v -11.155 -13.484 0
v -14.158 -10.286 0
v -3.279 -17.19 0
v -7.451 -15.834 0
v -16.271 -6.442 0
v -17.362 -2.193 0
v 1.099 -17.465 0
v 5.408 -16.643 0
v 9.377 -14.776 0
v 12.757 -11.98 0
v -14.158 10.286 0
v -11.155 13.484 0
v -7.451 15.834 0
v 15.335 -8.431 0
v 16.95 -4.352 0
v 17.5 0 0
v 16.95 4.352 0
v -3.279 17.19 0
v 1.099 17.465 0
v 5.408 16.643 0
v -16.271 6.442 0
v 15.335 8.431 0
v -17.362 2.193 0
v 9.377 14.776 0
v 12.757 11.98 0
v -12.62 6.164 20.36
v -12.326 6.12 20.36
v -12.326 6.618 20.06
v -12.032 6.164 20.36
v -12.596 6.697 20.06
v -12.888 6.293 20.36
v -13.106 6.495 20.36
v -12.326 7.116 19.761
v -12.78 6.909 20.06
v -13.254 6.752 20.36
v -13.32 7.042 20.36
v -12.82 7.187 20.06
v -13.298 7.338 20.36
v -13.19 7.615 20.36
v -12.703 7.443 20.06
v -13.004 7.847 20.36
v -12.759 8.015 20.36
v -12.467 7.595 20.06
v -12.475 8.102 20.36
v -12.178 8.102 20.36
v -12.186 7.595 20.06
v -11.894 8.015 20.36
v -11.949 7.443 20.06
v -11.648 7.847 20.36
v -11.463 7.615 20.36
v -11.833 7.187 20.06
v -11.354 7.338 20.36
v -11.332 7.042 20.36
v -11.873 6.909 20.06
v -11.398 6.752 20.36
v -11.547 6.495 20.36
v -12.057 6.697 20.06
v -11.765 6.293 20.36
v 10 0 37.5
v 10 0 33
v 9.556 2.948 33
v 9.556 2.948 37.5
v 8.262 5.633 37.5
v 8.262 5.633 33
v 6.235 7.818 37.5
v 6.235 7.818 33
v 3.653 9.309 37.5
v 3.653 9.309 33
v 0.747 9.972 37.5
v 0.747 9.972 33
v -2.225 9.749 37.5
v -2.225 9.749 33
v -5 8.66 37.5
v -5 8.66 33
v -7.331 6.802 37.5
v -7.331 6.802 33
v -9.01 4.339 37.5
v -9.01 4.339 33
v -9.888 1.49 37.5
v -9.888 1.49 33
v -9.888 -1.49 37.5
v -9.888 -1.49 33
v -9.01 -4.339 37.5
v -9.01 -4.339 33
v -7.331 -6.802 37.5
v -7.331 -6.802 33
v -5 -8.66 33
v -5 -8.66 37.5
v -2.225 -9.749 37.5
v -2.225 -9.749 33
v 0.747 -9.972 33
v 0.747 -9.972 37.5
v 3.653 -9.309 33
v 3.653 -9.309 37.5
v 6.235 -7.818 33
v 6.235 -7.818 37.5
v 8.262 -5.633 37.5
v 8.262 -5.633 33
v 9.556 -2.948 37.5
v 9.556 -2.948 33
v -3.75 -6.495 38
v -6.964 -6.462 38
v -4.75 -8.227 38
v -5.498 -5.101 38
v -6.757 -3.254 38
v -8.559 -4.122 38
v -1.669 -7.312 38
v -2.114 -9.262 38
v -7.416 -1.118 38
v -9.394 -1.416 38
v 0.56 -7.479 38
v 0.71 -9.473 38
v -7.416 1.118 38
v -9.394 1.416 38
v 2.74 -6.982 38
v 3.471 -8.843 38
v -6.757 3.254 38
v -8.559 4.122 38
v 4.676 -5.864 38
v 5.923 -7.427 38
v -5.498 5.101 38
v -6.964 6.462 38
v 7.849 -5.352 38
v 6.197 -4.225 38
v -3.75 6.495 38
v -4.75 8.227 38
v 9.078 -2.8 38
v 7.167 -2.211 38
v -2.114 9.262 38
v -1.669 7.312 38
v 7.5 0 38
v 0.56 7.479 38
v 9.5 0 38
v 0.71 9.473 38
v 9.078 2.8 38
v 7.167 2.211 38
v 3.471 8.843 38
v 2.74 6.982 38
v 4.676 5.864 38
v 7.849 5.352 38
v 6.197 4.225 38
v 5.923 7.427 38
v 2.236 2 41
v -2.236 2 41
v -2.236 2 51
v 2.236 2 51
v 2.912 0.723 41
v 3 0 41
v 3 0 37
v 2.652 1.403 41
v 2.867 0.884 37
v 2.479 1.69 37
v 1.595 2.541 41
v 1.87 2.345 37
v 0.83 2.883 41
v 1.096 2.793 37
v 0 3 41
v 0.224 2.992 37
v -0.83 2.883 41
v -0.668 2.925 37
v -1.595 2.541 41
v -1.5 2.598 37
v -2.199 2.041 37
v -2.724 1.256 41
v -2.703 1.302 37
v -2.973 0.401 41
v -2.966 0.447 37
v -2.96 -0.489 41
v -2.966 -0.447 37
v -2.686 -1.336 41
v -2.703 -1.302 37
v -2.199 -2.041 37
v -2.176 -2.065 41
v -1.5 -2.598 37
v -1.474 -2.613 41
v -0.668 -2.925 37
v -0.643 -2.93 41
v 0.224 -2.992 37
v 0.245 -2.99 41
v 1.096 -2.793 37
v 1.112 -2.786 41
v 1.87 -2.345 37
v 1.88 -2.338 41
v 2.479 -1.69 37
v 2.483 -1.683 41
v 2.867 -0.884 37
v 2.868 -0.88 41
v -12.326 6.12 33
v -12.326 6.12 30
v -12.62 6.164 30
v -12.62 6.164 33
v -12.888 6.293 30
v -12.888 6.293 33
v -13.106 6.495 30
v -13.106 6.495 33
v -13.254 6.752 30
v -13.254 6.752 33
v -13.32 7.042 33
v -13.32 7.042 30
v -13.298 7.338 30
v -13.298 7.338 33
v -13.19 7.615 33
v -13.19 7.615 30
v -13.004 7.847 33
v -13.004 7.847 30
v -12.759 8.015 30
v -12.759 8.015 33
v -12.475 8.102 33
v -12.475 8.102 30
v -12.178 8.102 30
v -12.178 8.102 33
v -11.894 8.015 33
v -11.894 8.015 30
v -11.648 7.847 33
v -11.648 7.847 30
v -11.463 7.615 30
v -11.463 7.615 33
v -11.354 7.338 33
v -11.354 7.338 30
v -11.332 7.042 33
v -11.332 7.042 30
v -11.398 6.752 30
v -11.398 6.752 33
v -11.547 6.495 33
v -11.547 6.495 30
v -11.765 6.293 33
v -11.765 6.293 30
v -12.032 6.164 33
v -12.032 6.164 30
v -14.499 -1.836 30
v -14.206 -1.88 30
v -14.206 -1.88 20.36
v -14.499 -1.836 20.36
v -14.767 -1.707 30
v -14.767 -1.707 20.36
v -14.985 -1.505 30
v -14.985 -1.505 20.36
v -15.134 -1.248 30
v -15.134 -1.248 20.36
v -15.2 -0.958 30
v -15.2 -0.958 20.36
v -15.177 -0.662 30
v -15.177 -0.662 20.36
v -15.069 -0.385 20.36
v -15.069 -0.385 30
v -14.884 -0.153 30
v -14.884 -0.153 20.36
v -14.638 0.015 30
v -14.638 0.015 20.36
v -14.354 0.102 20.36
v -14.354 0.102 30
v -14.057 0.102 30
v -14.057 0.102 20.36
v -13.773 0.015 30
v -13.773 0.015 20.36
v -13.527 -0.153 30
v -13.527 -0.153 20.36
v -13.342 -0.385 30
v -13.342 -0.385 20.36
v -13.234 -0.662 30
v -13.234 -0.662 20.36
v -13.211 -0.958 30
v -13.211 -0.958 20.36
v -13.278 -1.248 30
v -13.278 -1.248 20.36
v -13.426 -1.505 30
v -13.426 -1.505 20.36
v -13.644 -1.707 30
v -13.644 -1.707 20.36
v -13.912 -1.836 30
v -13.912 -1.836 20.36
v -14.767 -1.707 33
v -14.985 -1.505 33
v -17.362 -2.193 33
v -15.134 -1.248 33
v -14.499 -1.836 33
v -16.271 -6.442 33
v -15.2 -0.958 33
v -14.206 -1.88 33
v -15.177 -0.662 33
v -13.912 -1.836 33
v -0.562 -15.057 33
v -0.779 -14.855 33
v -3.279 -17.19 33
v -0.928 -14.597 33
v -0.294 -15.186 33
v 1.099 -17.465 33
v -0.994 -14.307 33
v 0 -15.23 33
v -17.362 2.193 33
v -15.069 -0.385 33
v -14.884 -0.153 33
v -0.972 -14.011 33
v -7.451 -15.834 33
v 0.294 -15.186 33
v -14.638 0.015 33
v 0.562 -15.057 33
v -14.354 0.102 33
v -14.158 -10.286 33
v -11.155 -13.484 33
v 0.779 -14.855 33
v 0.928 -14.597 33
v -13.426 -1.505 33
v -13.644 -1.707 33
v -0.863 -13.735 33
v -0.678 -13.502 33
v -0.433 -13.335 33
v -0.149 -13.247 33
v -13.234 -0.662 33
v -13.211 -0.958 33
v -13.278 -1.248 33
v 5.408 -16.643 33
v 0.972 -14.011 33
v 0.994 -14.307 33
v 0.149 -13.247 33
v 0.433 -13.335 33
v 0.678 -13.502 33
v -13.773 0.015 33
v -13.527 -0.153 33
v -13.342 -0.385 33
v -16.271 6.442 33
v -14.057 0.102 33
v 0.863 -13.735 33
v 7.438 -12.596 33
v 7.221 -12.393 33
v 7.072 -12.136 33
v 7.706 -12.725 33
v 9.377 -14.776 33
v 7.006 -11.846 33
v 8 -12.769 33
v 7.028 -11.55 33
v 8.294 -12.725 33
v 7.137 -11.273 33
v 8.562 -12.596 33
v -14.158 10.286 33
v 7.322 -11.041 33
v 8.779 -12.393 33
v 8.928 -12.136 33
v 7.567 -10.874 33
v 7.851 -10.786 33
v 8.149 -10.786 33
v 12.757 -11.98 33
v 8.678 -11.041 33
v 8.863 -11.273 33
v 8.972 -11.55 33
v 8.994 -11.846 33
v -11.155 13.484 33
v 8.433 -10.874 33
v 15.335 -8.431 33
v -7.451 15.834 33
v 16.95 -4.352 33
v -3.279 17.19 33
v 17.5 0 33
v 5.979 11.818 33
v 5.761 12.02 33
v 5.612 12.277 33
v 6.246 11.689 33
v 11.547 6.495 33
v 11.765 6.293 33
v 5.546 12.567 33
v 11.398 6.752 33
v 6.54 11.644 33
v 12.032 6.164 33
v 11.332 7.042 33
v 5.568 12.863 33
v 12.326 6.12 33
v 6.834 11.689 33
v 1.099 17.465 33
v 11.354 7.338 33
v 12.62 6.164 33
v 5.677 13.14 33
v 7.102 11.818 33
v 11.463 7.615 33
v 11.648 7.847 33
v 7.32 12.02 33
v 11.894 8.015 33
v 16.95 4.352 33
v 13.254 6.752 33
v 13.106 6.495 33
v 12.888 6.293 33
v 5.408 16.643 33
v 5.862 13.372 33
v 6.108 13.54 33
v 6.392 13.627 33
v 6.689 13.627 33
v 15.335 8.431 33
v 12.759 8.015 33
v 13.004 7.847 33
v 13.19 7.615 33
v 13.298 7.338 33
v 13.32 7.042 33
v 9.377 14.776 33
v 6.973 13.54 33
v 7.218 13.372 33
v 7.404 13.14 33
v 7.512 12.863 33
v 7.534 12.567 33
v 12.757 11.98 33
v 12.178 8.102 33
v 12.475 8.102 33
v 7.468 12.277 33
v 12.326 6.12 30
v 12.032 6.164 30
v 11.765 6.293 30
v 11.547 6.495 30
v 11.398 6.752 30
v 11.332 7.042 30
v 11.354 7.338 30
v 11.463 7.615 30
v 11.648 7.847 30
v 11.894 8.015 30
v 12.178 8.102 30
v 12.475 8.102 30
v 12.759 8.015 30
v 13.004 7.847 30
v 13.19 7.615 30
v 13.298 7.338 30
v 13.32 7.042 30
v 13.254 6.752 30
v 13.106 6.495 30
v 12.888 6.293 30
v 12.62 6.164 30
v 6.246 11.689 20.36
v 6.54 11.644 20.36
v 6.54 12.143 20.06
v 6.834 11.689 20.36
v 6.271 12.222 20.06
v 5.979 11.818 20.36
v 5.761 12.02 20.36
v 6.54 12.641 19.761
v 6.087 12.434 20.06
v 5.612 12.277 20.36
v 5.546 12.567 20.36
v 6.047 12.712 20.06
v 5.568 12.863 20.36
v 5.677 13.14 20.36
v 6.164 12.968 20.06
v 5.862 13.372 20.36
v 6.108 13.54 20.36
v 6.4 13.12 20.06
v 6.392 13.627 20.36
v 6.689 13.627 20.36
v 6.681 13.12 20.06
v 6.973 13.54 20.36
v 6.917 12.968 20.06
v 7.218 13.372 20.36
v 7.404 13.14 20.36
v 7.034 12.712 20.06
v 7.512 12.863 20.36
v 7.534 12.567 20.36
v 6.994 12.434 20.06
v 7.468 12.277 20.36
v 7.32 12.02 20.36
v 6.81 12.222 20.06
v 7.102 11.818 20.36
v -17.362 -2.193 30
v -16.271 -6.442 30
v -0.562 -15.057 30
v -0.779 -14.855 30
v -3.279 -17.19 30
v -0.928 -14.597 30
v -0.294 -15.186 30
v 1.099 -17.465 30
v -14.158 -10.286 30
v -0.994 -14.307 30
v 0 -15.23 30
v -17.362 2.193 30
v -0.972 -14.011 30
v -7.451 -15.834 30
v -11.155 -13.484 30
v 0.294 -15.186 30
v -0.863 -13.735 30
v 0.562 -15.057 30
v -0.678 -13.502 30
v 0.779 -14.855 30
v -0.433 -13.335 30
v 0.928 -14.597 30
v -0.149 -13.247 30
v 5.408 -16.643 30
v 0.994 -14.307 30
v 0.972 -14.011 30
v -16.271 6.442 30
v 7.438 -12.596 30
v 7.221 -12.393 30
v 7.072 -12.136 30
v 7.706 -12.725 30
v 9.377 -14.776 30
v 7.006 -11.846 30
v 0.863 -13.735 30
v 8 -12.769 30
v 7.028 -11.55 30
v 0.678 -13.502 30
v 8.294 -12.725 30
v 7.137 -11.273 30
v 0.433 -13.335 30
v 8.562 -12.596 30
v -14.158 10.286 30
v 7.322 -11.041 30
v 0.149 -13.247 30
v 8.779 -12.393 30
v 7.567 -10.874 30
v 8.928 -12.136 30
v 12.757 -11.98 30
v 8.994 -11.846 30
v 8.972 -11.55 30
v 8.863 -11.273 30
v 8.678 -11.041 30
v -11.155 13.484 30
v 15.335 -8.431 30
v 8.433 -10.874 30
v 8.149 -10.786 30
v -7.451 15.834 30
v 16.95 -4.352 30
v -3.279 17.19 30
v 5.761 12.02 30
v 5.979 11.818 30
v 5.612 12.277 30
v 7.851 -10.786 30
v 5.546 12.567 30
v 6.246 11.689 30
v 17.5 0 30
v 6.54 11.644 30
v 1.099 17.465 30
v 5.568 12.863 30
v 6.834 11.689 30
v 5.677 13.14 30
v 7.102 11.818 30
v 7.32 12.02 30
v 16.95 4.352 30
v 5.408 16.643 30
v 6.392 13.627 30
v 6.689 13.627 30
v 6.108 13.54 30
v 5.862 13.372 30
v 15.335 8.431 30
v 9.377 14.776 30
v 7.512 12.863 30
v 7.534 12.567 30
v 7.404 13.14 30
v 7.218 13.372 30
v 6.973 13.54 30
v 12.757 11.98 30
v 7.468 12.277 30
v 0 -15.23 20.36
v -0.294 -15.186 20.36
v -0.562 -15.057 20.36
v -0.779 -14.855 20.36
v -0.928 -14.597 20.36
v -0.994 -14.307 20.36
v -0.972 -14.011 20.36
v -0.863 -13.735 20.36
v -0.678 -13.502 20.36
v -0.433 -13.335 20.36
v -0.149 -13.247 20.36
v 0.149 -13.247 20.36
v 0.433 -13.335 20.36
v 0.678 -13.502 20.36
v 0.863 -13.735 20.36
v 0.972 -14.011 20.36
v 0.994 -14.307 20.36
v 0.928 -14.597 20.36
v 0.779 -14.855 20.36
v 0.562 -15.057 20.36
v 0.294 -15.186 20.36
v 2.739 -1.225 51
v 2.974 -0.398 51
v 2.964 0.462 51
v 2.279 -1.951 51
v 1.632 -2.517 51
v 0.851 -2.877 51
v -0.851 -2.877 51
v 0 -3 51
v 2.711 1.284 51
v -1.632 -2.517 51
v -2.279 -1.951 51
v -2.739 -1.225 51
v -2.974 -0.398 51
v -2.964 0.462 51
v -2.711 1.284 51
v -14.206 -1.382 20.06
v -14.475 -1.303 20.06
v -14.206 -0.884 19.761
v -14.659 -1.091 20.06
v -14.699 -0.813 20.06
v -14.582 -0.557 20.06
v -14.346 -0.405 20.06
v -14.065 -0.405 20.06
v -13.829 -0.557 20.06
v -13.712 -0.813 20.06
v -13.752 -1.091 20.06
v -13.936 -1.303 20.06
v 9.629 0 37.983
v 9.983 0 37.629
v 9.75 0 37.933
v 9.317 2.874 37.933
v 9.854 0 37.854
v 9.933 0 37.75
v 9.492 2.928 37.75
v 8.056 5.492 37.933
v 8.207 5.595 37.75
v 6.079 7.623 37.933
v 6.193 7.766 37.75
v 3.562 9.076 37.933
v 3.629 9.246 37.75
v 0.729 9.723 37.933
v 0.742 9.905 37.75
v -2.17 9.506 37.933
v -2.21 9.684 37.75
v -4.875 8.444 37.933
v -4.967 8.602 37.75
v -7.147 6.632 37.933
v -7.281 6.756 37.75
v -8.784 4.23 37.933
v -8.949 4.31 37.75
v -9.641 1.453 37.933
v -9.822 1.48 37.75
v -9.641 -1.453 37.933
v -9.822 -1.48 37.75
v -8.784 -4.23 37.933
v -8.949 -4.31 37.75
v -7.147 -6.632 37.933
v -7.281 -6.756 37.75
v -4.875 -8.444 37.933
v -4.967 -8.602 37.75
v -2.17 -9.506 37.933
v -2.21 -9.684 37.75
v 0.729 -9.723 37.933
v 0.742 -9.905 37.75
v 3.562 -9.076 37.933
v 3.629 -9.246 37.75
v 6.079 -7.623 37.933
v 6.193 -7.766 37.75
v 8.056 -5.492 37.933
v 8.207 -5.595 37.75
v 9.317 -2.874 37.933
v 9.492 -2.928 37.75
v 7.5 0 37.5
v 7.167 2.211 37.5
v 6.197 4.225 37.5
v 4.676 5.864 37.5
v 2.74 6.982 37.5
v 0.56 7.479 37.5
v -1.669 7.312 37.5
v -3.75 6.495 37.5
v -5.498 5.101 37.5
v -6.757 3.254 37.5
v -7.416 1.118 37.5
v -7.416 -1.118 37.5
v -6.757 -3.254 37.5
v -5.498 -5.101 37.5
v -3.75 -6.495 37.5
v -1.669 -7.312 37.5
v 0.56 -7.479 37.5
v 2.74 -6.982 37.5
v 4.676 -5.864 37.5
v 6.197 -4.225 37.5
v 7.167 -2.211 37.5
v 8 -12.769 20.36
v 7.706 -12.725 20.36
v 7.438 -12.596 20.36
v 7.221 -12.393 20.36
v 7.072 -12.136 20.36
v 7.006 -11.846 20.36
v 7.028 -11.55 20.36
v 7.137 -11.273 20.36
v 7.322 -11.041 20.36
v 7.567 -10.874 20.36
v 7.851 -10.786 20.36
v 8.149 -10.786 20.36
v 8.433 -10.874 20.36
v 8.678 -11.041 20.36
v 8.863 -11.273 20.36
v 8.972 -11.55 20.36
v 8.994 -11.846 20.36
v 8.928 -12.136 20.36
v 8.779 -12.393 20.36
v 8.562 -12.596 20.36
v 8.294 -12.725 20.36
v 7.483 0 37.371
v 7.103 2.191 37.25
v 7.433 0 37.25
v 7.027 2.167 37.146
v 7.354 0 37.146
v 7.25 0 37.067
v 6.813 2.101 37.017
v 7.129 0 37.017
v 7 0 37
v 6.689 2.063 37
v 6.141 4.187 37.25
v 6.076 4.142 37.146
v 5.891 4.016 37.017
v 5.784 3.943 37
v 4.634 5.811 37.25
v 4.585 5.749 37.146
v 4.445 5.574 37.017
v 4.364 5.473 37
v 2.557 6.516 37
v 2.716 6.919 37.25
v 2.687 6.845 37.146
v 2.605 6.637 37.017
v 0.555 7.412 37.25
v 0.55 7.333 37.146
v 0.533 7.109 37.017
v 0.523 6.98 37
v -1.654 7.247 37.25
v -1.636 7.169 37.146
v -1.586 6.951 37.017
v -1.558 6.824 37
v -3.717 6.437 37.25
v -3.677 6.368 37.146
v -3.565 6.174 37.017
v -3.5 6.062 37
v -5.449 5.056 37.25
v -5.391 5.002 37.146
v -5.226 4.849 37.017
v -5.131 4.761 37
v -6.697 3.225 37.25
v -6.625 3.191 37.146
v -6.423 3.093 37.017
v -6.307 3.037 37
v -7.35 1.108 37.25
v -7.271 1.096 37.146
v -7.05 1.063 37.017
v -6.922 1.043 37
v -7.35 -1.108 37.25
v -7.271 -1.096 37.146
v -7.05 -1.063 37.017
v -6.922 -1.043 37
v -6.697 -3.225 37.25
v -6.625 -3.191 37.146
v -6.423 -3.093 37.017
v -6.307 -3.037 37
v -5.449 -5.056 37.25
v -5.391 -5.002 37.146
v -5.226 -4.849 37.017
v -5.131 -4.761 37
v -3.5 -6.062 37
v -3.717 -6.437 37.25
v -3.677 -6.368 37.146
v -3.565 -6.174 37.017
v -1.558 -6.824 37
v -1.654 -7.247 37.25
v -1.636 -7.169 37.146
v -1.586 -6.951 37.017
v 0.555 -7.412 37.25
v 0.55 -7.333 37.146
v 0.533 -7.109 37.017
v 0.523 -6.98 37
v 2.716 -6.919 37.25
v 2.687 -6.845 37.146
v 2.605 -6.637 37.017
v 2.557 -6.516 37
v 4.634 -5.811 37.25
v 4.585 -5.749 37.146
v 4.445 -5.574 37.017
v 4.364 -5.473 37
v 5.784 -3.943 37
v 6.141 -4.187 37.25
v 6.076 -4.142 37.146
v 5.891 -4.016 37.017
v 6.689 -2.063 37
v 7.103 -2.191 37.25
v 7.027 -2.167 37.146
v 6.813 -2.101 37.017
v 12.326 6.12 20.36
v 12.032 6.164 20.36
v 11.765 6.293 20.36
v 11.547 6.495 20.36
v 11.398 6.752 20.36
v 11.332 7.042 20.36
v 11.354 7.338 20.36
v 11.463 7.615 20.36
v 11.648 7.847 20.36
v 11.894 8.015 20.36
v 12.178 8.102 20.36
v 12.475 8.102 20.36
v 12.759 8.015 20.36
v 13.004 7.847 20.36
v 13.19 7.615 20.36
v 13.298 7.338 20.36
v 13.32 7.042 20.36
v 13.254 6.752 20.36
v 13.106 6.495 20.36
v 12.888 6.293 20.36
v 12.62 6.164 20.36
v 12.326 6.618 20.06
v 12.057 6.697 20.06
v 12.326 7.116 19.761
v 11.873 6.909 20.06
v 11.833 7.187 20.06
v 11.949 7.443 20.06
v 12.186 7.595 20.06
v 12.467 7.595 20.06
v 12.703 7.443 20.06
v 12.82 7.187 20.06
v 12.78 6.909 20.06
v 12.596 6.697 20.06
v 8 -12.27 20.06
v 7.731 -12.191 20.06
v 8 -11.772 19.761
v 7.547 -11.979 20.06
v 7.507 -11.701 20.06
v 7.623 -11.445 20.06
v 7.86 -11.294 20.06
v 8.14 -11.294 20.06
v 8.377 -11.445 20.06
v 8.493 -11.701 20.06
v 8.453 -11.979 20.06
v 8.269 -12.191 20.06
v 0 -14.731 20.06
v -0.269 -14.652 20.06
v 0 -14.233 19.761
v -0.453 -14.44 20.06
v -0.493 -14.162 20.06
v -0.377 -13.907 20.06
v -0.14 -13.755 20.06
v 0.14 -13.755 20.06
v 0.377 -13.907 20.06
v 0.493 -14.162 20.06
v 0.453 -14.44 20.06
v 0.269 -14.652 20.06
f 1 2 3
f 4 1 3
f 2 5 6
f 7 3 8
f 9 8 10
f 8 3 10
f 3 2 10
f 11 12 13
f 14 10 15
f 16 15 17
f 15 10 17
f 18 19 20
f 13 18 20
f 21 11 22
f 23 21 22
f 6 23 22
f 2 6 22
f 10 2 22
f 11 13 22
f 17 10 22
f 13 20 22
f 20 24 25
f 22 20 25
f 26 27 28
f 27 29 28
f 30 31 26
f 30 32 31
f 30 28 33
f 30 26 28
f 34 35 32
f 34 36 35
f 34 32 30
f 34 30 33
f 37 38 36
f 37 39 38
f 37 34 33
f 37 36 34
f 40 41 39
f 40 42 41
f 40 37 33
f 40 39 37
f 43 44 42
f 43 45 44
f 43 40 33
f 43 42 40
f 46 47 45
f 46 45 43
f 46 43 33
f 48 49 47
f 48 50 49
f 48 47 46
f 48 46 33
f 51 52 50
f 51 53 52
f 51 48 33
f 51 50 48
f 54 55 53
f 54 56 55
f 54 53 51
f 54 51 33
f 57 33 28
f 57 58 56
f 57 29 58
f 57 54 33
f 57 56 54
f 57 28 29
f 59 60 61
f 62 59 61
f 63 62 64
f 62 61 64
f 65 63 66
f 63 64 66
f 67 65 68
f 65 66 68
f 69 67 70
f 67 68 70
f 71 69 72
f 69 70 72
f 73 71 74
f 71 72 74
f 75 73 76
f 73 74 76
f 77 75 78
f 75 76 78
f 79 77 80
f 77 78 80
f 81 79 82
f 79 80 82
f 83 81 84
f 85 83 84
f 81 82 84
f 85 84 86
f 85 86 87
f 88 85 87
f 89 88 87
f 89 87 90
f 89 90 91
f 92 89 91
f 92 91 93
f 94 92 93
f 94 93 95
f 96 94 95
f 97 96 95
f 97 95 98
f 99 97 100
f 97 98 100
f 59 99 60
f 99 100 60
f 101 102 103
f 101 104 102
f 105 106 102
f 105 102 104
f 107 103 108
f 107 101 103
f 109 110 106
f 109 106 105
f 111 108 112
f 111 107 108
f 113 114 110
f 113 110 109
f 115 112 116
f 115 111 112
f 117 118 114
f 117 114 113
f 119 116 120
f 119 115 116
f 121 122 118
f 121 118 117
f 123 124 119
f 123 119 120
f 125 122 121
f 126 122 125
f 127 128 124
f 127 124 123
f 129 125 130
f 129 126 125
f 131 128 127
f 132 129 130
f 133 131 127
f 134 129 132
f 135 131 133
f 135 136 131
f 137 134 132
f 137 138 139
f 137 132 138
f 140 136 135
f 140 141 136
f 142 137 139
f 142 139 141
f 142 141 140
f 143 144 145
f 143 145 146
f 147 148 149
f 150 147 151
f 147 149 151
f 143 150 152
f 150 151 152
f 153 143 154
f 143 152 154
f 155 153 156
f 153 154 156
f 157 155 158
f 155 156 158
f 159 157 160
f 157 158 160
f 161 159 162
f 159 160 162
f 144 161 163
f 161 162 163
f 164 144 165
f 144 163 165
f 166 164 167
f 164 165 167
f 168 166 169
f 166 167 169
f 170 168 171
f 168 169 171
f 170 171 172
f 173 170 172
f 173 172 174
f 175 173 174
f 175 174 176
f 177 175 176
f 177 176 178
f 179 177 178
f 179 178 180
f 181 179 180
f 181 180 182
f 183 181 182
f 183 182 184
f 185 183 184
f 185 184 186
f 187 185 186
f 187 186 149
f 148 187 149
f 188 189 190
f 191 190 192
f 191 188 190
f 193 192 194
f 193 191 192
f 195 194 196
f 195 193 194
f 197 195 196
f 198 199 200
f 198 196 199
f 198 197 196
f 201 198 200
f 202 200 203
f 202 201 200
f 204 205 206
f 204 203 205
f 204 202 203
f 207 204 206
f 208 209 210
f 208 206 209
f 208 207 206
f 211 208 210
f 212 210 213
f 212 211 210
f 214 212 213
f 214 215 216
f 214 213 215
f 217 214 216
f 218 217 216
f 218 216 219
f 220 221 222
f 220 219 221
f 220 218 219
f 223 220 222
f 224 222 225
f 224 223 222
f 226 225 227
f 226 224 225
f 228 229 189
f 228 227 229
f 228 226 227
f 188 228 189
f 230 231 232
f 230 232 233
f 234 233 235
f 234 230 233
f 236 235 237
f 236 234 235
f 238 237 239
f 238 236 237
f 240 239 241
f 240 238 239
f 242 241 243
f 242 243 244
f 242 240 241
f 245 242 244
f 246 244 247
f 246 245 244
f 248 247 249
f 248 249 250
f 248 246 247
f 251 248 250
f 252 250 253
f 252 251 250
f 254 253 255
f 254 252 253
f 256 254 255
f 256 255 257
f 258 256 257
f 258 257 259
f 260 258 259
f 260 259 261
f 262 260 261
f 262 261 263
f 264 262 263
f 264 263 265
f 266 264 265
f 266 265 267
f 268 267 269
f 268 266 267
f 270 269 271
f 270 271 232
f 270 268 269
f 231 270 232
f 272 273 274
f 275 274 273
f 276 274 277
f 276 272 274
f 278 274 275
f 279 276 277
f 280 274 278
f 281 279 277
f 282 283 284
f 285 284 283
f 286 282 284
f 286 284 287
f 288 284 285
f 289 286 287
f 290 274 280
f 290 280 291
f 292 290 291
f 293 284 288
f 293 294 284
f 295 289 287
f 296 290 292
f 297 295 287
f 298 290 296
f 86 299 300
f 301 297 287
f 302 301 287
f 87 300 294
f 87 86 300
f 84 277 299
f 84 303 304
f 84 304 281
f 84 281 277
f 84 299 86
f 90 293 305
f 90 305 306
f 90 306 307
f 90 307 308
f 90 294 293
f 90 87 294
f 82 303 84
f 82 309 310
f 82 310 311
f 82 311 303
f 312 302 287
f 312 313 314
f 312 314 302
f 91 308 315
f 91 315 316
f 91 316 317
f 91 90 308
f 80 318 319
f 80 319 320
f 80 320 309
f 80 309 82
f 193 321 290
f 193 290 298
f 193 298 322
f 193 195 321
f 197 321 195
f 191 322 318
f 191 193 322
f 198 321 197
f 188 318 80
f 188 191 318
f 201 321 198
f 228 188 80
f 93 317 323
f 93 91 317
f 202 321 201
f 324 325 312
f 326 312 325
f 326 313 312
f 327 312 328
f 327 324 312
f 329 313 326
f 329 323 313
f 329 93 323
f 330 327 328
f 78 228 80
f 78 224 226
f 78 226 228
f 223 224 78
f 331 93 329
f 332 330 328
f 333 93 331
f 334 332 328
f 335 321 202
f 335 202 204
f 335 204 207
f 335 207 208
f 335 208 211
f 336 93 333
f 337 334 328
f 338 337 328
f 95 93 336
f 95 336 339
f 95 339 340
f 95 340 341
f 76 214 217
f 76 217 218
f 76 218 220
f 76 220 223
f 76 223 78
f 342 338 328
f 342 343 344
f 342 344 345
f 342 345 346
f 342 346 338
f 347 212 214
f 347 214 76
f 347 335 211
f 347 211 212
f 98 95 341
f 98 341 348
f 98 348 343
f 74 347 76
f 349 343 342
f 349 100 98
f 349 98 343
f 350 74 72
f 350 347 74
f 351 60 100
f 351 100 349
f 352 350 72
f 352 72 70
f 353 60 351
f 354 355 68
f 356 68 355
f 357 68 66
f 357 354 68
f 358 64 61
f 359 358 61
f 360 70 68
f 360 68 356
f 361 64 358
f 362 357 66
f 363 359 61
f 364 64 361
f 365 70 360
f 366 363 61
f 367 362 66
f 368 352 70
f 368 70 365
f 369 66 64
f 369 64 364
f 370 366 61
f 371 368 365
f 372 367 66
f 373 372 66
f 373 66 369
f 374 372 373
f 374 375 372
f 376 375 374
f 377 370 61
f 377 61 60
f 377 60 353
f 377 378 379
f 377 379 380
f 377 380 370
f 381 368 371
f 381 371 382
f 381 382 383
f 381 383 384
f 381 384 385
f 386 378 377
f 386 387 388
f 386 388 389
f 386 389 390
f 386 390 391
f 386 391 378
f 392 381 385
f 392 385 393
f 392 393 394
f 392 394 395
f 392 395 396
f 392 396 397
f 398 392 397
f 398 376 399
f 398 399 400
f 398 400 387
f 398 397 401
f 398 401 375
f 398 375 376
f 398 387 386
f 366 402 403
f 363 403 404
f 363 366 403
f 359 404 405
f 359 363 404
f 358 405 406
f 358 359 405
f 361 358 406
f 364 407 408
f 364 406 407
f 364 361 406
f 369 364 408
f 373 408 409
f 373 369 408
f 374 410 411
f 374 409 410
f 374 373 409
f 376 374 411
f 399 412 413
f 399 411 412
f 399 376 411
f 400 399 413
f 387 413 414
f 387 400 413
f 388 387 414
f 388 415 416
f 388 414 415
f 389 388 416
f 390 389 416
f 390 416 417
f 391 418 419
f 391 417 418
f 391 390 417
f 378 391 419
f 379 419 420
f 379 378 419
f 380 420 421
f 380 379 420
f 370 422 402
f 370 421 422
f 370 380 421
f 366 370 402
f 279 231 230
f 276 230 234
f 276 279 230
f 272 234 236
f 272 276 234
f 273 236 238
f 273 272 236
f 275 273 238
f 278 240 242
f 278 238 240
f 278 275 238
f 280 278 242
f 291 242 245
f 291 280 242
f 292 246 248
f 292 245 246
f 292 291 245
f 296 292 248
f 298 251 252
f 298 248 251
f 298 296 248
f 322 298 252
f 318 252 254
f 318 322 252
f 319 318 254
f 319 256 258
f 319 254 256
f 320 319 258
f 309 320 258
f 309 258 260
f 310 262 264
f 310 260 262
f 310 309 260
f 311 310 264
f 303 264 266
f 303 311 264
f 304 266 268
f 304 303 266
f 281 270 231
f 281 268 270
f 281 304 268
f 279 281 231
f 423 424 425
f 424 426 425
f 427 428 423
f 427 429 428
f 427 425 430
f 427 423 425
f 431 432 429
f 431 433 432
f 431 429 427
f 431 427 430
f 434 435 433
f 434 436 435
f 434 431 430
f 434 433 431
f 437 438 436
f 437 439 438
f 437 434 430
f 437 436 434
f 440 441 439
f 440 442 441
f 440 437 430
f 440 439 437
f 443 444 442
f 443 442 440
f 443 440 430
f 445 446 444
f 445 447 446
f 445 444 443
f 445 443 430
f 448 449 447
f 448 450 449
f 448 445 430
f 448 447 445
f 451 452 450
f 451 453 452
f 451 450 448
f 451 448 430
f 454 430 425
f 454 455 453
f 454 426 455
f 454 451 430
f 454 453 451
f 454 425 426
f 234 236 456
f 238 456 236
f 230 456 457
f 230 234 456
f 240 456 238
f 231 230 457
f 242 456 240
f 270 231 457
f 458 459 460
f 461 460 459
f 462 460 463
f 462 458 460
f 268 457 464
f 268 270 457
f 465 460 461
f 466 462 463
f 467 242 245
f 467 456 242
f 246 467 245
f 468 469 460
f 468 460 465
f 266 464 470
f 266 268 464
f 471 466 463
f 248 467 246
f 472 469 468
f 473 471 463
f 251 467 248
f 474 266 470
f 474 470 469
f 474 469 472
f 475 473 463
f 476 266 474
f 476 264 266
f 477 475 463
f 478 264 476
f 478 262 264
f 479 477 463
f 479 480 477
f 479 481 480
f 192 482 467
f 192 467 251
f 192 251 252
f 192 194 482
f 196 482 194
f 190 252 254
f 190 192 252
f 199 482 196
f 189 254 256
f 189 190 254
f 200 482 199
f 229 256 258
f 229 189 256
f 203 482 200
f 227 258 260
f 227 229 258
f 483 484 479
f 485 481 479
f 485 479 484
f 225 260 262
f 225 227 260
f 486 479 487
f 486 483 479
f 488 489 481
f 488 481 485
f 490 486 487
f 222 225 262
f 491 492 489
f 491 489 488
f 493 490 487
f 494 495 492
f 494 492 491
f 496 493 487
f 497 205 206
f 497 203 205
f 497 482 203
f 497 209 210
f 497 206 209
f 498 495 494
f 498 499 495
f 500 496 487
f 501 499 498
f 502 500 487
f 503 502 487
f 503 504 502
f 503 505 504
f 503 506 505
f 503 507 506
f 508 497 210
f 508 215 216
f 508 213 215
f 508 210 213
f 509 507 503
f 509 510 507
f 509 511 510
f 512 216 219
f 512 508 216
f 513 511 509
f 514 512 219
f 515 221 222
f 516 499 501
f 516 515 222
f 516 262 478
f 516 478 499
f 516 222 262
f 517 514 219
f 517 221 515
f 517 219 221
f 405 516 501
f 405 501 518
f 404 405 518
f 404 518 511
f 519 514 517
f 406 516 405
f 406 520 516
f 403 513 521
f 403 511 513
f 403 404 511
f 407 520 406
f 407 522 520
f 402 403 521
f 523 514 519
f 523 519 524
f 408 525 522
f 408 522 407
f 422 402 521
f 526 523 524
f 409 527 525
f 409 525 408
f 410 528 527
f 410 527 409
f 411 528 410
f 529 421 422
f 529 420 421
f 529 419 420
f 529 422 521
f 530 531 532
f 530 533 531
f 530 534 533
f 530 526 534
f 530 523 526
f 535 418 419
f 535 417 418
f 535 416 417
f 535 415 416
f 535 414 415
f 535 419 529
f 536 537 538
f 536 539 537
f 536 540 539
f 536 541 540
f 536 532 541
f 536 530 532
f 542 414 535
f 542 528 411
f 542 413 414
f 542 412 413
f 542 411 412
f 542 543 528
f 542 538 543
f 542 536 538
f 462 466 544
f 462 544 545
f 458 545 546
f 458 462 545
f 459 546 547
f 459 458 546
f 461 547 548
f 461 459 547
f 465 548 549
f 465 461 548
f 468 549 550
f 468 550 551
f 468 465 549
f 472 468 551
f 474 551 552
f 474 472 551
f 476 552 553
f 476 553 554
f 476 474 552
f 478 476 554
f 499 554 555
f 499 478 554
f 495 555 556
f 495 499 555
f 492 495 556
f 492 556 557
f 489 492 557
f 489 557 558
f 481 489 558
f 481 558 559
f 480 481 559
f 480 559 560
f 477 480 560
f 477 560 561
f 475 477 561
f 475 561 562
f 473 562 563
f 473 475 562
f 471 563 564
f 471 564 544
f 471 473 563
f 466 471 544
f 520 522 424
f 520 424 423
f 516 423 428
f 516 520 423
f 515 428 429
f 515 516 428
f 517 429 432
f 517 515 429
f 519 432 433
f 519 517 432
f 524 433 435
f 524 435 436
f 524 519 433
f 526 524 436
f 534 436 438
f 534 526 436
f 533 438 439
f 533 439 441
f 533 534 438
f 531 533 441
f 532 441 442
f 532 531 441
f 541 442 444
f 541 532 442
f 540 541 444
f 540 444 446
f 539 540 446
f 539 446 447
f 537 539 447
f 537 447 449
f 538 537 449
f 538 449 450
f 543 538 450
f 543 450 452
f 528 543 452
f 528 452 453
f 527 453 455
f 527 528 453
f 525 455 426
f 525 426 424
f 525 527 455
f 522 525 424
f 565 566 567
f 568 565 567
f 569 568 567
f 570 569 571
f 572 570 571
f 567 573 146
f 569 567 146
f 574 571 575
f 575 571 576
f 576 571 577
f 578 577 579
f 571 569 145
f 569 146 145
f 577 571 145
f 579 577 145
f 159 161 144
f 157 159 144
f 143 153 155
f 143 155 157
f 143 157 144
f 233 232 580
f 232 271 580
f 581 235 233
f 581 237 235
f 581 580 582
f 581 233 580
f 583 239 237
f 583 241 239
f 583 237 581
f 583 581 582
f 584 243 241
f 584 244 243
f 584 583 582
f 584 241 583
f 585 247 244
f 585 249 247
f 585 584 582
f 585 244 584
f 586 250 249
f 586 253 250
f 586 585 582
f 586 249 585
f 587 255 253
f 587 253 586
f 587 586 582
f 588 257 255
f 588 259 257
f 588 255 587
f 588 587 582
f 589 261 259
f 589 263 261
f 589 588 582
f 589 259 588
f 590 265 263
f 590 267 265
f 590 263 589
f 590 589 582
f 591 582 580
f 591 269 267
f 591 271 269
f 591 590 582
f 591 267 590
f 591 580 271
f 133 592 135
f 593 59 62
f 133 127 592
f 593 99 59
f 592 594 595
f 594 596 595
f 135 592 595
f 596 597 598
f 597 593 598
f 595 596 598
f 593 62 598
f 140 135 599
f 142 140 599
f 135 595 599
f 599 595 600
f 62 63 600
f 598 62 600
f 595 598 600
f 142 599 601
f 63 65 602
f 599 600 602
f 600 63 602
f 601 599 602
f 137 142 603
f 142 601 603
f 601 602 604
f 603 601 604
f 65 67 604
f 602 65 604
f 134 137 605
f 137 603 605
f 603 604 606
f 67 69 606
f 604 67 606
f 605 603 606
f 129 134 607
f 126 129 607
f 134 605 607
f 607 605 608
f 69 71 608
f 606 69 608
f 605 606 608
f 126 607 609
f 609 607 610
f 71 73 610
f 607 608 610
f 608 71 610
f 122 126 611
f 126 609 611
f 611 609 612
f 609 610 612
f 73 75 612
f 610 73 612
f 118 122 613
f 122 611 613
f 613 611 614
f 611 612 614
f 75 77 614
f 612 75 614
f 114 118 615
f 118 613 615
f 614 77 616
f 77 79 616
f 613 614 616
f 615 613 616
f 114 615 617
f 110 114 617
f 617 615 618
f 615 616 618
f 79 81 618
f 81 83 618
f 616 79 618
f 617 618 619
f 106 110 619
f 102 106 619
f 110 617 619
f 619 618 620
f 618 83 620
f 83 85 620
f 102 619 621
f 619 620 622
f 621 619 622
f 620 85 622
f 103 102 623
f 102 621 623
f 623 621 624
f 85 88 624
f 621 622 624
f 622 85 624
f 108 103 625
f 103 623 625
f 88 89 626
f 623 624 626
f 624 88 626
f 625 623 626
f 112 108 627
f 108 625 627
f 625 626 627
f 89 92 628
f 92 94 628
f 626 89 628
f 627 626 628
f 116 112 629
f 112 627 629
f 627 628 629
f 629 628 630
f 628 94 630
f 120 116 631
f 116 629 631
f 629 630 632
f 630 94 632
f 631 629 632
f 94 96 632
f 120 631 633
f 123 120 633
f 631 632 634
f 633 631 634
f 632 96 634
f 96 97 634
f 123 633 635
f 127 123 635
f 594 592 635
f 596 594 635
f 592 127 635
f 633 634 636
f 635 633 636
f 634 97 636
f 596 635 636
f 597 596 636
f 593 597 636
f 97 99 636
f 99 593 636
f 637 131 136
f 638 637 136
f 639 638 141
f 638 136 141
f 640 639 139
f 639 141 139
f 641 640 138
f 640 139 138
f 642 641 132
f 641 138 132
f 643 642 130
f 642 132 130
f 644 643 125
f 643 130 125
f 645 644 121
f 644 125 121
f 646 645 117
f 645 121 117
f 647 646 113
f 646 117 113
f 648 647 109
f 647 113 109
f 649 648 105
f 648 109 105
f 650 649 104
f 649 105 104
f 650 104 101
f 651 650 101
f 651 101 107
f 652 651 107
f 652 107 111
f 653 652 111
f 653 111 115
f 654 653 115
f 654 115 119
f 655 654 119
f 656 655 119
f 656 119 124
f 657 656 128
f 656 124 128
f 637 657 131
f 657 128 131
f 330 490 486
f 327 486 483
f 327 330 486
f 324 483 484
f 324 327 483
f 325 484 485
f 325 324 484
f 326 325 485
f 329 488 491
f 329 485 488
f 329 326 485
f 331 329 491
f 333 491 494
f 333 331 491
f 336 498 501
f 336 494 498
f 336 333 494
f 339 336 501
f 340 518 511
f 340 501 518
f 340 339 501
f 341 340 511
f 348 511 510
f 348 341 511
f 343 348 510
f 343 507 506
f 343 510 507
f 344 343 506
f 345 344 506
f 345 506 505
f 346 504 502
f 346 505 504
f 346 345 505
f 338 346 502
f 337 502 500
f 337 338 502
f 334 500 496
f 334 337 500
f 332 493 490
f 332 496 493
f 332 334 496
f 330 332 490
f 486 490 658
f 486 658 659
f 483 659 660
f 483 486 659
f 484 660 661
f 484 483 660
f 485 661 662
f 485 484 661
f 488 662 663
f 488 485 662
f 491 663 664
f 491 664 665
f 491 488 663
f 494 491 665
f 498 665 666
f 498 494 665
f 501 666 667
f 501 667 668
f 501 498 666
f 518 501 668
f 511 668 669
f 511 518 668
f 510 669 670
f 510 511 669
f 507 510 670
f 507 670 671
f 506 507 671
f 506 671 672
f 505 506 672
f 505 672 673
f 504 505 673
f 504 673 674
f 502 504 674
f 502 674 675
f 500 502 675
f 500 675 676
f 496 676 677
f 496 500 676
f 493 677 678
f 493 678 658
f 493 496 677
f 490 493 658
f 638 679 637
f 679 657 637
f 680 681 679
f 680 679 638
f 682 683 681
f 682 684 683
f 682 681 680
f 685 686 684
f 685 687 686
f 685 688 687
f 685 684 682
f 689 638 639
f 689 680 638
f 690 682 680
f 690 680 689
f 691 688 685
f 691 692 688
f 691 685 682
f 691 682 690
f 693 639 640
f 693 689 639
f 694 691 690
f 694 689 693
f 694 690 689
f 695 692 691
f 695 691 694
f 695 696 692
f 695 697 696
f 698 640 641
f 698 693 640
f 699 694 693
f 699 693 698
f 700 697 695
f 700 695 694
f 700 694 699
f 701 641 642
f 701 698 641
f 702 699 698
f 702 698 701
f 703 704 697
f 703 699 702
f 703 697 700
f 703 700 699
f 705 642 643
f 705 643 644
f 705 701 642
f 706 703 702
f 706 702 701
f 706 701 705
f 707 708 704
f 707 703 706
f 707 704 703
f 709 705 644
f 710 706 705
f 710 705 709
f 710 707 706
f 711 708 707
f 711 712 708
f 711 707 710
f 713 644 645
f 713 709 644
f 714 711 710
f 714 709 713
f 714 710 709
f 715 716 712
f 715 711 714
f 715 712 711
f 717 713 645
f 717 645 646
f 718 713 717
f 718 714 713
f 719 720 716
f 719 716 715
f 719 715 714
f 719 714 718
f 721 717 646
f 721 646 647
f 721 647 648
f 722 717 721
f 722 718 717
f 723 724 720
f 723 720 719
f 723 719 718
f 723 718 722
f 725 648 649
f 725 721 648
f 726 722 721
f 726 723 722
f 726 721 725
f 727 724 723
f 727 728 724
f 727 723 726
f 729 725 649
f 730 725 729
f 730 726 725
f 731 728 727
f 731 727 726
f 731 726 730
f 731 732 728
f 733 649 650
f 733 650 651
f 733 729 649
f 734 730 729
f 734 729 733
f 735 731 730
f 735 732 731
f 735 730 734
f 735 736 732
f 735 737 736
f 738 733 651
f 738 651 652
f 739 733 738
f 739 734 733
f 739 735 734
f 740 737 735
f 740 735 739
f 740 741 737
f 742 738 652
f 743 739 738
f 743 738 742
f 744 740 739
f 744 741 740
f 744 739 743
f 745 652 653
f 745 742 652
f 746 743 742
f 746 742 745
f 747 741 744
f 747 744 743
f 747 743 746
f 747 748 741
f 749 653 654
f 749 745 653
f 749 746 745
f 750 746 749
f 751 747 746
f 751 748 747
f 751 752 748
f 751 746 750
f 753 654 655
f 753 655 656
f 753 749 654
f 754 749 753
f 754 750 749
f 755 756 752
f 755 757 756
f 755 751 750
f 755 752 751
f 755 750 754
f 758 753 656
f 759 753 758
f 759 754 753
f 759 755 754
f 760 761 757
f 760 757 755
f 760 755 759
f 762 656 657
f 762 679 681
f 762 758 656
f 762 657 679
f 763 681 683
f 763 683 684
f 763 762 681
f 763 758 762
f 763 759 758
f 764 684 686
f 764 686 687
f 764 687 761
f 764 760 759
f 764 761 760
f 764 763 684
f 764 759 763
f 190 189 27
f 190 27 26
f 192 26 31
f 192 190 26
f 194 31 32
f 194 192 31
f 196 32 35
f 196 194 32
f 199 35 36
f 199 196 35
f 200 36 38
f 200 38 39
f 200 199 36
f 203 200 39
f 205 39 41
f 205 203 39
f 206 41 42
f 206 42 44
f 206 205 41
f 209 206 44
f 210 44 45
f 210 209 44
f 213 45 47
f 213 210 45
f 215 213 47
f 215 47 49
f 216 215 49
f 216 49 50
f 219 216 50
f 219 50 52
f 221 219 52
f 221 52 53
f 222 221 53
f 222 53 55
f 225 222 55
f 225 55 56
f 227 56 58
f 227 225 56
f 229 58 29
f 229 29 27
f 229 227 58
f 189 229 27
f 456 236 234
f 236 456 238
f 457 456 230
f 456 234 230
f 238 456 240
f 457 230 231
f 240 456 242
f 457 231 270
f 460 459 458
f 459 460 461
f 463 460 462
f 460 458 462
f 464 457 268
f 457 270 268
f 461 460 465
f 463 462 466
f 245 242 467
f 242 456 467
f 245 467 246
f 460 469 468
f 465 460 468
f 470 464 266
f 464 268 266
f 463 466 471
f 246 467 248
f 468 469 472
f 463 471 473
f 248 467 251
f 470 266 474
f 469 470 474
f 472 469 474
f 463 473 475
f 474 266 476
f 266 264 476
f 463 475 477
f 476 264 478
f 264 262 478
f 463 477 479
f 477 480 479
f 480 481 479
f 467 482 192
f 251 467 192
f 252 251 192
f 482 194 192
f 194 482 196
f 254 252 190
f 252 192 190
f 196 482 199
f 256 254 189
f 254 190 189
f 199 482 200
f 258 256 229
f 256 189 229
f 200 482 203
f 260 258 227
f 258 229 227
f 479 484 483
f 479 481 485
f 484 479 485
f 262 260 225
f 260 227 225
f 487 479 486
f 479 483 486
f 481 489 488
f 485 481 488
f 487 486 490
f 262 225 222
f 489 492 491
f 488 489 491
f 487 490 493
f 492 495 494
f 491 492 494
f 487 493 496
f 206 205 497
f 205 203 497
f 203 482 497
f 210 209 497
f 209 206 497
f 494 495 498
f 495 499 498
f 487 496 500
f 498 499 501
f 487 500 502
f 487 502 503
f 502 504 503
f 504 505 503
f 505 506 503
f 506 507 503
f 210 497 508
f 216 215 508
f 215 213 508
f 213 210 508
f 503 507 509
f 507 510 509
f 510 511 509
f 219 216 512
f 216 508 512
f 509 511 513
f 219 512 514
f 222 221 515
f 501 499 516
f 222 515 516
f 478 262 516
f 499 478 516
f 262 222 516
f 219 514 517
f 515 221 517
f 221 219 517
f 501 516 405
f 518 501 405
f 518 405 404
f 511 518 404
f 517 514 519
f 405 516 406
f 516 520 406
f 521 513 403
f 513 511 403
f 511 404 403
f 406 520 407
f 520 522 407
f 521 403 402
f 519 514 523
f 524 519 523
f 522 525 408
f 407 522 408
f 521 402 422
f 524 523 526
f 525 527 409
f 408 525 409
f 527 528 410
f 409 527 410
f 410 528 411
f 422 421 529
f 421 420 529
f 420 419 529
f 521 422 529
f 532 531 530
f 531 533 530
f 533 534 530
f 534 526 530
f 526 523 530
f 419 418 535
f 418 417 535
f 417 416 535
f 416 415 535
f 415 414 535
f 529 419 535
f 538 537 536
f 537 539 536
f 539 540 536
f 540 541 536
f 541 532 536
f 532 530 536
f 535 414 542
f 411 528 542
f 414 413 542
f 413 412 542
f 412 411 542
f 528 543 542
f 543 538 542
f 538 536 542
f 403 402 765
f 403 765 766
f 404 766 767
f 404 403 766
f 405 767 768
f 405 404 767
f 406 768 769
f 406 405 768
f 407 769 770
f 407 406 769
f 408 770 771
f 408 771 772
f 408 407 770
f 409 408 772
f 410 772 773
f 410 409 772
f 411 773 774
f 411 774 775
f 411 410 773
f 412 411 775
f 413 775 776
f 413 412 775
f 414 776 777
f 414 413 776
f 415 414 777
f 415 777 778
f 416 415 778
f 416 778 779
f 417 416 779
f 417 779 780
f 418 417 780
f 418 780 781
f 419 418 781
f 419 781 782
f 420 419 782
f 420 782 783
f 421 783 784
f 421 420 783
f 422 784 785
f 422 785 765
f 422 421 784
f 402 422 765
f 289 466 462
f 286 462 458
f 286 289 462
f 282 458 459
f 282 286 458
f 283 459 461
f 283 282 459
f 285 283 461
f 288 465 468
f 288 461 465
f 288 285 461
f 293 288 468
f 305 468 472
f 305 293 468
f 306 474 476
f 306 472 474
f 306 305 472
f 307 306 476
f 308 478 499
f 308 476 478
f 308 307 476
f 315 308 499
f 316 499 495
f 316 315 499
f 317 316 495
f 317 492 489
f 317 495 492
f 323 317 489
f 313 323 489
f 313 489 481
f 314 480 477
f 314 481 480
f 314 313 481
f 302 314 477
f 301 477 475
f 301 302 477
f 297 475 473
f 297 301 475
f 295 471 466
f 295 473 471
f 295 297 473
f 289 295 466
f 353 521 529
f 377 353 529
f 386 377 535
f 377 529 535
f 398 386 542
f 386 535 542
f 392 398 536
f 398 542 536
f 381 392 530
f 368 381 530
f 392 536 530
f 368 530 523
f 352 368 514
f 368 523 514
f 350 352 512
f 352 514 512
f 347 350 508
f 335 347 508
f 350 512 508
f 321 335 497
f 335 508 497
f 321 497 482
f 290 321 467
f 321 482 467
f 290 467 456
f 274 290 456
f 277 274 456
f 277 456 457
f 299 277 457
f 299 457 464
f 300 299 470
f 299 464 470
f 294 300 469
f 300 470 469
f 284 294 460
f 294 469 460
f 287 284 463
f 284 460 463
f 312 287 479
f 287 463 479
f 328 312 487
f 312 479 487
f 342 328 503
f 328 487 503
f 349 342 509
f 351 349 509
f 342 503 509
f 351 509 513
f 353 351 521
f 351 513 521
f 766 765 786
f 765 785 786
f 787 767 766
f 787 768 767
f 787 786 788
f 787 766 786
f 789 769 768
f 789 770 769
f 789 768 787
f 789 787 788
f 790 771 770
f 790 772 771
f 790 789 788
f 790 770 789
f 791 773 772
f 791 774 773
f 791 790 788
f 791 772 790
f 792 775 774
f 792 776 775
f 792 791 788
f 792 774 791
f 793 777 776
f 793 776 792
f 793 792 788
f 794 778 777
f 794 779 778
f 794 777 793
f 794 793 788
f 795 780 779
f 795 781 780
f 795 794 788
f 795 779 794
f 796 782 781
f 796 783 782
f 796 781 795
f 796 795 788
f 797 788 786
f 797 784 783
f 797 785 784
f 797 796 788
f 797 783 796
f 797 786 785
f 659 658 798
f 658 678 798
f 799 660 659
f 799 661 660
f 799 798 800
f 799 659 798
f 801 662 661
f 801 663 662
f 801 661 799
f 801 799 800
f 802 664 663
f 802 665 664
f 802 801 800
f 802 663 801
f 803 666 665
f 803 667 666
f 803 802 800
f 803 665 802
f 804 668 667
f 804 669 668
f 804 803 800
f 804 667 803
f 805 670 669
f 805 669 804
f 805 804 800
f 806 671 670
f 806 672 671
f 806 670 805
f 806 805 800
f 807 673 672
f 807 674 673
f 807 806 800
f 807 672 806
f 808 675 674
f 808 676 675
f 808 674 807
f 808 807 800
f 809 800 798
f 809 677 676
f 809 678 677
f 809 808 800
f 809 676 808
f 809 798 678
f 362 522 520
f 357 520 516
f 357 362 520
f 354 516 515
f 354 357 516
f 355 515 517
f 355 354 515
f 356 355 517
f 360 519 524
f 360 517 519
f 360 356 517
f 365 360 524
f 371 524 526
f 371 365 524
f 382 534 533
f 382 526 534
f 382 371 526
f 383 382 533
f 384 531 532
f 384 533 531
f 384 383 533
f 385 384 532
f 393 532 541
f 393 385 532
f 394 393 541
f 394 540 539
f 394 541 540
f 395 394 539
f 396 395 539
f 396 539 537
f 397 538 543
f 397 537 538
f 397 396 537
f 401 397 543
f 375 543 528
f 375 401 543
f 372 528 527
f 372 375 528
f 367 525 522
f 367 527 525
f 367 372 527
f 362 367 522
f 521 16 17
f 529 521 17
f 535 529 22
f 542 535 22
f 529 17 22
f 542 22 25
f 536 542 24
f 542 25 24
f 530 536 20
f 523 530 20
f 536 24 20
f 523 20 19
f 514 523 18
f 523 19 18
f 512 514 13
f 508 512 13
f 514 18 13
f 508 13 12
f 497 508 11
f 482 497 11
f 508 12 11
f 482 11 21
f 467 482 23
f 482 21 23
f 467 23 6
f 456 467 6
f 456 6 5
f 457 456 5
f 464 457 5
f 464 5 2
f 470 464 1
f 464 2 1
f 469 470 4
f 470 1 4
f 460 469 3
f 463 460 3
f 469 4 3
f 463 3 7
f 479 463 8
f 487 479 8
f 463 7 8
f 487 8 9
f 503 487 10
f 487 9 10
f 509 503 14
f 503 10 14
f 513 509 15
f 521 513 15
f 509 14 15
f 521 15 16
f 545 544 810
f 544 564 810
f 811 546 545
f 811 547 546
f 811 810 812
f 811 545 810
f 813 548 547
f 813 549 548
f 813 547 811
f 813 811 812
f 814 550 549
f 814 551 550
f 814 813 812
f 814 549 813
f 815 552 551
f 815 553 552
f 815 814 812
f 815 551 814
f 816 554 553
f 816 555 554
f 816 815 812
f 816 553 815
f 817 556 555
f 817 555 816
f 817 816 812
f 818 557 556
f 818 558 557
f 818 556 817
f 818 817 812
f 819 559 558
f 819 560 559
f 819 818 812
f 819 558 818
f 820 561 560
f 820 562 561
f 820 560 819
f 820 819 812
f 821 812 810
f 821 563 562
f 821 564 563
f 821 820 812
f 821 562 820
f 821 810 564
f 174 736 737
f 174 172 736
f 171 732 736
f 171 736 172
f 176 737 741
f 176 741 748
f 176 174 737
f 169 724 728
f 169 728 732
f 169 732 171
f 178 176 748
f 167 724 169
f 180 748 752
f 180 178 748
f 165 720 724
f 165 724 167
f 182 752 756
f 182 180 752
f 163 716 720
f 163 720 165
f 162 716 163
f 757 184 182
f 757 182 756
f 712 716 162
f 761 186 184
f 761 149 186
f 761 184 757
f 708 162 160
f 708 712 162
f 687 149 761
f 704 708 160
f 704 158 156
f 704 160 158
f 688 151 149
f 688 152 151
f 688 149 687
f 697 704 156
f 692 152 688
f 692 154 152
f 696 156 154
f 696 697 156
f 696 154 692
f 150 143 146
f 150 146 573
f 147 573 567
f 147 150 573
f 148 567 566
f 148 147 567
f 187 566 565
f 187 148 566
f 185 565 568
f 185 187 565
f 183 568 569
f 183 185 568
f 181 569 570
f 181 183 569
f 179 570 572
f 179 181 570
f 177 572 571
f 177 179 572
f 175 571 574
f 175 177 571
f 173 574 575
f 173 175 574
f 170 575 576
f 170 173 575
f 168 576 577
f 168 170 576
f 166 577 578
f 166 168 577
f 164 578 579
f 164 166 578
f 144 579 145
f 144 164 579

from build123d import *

# Parameters (mm, degrees)
SKETCH_1_R                    = 17.5
EXTRUDE_2_DEPTH               = 30
SKETCH_4_R                    = 17.5
EXTRUDE_4_DEPTH               = 3
SKETCH_5_R                    = 10
EXTRUDE_5_DEPTH               = 5
SKETCH_6_R                    = 7.5
CUT_EXTRUDE_1_DEPTH           = 1
FILLET_1_R                    = 0.5
SKETCH_7_R                    = 3
EXTRUDE_6_DEPTH               = 4
EXTRUDE_7_DEPTH               = 10
FILLET_2_R                    = 0.5
HOLE_WIZARD_3_48_1_AT_2_COUNT = 2
HOLE_WIZARD_3_48_1_AT_2_PITCH = 8.369999526
HOLE_WIZARD_3_48_1_AT_3_COUNT = 2
HOLE_WIZARD_3_48_1_AT_3_PITCH = 24.652251018
HOLE_WIZARD_3_48_1_AT_4_COUNT = 2
HOLE_WIZARD_3_48_1_AT_4_PITCH = 27.658687205
HOLE_WIZARD_3_48_1_AT_5_COUNT = 2
HOLE_WIZARD_3_48_1_AT_5_PITCH = 24.652251018
HOLE_WIZARD_3_48_1_AT_6_COUNT = 2
HOLE_WIZARD_3_48_1_AT_6_PITCH = 19.493735919


with BuildPart() as part:
    # 草图1 → 凸台-拉伸2 (new body)
    with BuildSketch(Plane.XY):
        Circle(SKETCH_1_R)
    extrude(amount=EXTRUDE_2_DEPTH)


with BuildPart() as body_2:
    # 草图4 → 凸台-拉伸4 (new body)
    with BuildSketch(Plane.XY.offset(30)):
        Circle(SKETCH_4_R)
    extrude(amount=EXTRUDE_4_DEPTH)

    # 草图5 → 凸台-拉伸5 (add)
    with BuildSketch(Plane.XY.offset(33)):
        Circle(SKETCH_5_R)
    extrude(amount=EXTRUDE_5_DEPTH)

    # 草图6 → 切除-拉伸1 (cut)
    with BuildSketch(Plane.XY.offset(38)):
        Circle(SKETCH_6_R)
    extrude(amount=-CUT_EXTRUDE_1_DEPTH, mode=Mode.SUBTRACT)

    # 圆角1
    fillet_1_edges = [body_2.edges().sort_by_distance(p)[0] for p in [
        (-7.5, 0, 37),
    ]]
    fillet(fillet_1_edges, radius=FILLET_1_R)

    # 草图7 → 凸台-拉伸6 (add)
    with BuildSketch(Plane.XY.offset(37)):
        Circle(SKETCH_7_R)
    extrude(amount=EXTRUDE_6_DEPTH)

    # 草图8 → 凸台-拉伸7 (add)
    with BuildSketch(Plane.XY.offset(41)):
        with BuildLine():
            Line((-2.236067977, 2), (2.236067977, 2))
            ThreePointArc((2.236067977, 2), (0, -3), (-2.236067977, 2))
        make_face()
    extrude(amount=EXTRUDE_7_DEPTH)

    # 圆角2
    fillet_2_edges = [body_2.edges().sort_by_distance(p)[0] for p in [
        (-10, 0, 38),
    ]]
    fillet(fillet_2_edges, radius=FILLET_2_R)


with BuildPart() as hole_wizard_3_48_1_tool:
    # 草图21 → #3-48 螺纹孔1 (revolve)
    with BuildSketch(Plane(origin=(0, -14.232983761, 33), x_dir=(0, -1, 0), z_dir=(1, 0, 0))):
        Polygon((0, 0), (0, 13.239027994), (0.99695, 12.64), (0.99695, 0), align=None)
    hole_wizard_3_48_1 = revolve(axis=Axis((0, -14.232983761, 39.35), (0, 0, -1)))


with BuildPart() as part_1:
    add(part.part)

    # #3-48 螺纹孔1: cut by hole_wizard_3_48_1_tool
    add(hole_wizard_3_48_1_tool.part, mode=Mode.SUBTRACT)


with BuildPart() as body_2_1:
    add(body_2.part)

    # #3-48 螺纹孔1: cut by hole_wizard_3_48_1_tool
    add(hole_wizard_3_48_1_tool.part, mode=Mode.SUBTRACT)


with BuildPart() as hole_wizard_3_48_1_at_2_tool:
    # #3-48 螺纹孔1 at 2: #3-48 螺纹孔1 ×2
    with Locations(*[Vector(0.9557945583075804, 0.2940353079302168, 0) * (i * HOLE_WIZARD_3_48_1_AT_2_PITCH) for i in range(1, HOLE_WIZARD_3_48_1_AT_2_COUNT)]):
        add(hole_wizard_3_48_1)


with BuildPart() as part_2:
    add(part_1.part)

    # #3-48 螺纹孔1 at 2: cut by hole_wizard_3_48_1_at_2_tool
    add(hole_wizard_3_48_1_at_2_tool.part, mode=Mode.SUBTRACT)


with BuildPart() as body_2_2:
    add(body_2_1.part)

    # #3-48 螺纹孔1 at 2: cut by hole_wizard_3_48_1_at_2_tool
    add(hole_wizard_3_48_1_at_2_tool.part, mode=Mode.SUBTRACT)


with BuildPart() as hole_wizard_3_48_1_at_3_tool:
    # #3-48 螺纹孔1 at 3: #3-48 螺纹孔1 ×2
    with Locations(*[Vector(0.500000000000004, 0.8660254037844364, 0) * (i * HOLE_WIZARD_3_48_1_AT_3_PITCH) for i in range(1, HOLE_WIZARD_3_48_1_AT_3_COUNT)]):
        add(hole_wizard_3_48_1)


with BuildPart() as part_3:
    add(part_2.part)

    # #3-48 螺纹孔1 at 3: cut by hole_wizard_3_48_1_at_3_tool
    add(hole_wizard_3_48_1_at_3_tool.part, mode=Mode.SUBTRACT)


with BuildPart() as body_2_3:
    add(body_2_2.part)

    # #3-48 螺纹孔1 at 3: cut by hole_wizard_3_48_1_at_3_tool
    add(hole_wizard_3_48_1_at_3_tool.part, mode=Mode.SUBTRACT)


with BuildPart() as hole_wizard_3_48_1_at_4_tool:
    # #3-48 螺纹孔1 at 4: #3-48 螺纹孔1 ×2
    with Locations(*[Vector(0.23646293387508172, 0.9716405101184228, 0) * (i * HOLE_WIZARD_3_48_1_AT_4_PITCH) for i in range(1, HOLE_WIZARD_3_48_1_AT_4_COUNT)]):
        add(hole_wizard_3_48_1)


with BuildPart() as part_4:
    add(part_3.part)

    # #3-48 螺纹孔1 at 4: cut by hole_wizard_3_48_1_at_4_tool
    add(hole_wizard_3_48_1_at_4_tool.part, mode=Mode.SUBTRACT)


with BuildPart() as body_2_4:
    add(body_2_3.part)

    # #3-48 螺纹孔1 at 4: cut by hole_wizard_3_48_1_at_4_tool
    add(hole_wizard_3_48_1_at_4_tool.part, mode=Mode.SUBTRACT)


with BuildPart() as hole_wizard_3_48_1_at_5_tool:
    # #3-48 螺纹孔1 at 5: #3-48 螺纹孔1 ×2
    with Locations(*[Vector(-0.5000000000000041, 0.8660254037844364, 0) * (i * HOLE_WIZARD_3_48_1_AT_5_PITCH) for i in range(1, HOLE_WIZARD_3_48_1_AT_5_COUNT)]):
        add(hole_wizard_3_48_1)


with BuildPart() as part_5:
    add(part_4.part)

    # #3-48 螺纹孔1 at 5: cut by hole_wizard_3_48_1_at_5_tool
    add(hole_wizard_3_48_1_at_5_tool.part, mode=Mode.SUBTRACT)


with BuildPart() as body_2_5:
    add(body_2_4.part)

    # #3-48 螺纹孔1 at 5: cut by hole_wizard_3_48_1_at_5_tool
    add(hole_wizard_3_48_1_at_5_tool.part, mode=Mode.SUBTRACT)


with BuildPart() as hole_wizard_3_48_1_at_6_tool:
    # #3-48 螺纹孔1 at 6: #3-48 螺纹孔1 ×2
    with Locations(*[Vector(-0.7287230936851111, 0.6848084788683628, 0) * (i * HOLE_WIZARD_3_48_1_AT_6_PITCH) for i in range(1, HOLE_WIZARD_3_48_1_AT_6_COUNT)]):
        add(hole_wizard_3_48_1)


with BuildPart() as part_6:
    add(part_5.part)

    # #3-48 螺纹孔1 at 6: cut by hole_wizard_3_48_1_at_6_tool
    add(hole_wizard_3_48_1_at_6_tool.part, mode=Mode.SUBTRACT)


with BuildPart() as body_2_6:
    add(body_2_5.part)

    # #3-48 螺纹孔1 at 6: cut by hole_wizard_3_48_1_at_6_tool
    add(hole_wizard_3_48_1_at_6_tool.part, mode=Mode.SUBTRACT)


solid = Compound([part_6.part, body_2_6.part])
